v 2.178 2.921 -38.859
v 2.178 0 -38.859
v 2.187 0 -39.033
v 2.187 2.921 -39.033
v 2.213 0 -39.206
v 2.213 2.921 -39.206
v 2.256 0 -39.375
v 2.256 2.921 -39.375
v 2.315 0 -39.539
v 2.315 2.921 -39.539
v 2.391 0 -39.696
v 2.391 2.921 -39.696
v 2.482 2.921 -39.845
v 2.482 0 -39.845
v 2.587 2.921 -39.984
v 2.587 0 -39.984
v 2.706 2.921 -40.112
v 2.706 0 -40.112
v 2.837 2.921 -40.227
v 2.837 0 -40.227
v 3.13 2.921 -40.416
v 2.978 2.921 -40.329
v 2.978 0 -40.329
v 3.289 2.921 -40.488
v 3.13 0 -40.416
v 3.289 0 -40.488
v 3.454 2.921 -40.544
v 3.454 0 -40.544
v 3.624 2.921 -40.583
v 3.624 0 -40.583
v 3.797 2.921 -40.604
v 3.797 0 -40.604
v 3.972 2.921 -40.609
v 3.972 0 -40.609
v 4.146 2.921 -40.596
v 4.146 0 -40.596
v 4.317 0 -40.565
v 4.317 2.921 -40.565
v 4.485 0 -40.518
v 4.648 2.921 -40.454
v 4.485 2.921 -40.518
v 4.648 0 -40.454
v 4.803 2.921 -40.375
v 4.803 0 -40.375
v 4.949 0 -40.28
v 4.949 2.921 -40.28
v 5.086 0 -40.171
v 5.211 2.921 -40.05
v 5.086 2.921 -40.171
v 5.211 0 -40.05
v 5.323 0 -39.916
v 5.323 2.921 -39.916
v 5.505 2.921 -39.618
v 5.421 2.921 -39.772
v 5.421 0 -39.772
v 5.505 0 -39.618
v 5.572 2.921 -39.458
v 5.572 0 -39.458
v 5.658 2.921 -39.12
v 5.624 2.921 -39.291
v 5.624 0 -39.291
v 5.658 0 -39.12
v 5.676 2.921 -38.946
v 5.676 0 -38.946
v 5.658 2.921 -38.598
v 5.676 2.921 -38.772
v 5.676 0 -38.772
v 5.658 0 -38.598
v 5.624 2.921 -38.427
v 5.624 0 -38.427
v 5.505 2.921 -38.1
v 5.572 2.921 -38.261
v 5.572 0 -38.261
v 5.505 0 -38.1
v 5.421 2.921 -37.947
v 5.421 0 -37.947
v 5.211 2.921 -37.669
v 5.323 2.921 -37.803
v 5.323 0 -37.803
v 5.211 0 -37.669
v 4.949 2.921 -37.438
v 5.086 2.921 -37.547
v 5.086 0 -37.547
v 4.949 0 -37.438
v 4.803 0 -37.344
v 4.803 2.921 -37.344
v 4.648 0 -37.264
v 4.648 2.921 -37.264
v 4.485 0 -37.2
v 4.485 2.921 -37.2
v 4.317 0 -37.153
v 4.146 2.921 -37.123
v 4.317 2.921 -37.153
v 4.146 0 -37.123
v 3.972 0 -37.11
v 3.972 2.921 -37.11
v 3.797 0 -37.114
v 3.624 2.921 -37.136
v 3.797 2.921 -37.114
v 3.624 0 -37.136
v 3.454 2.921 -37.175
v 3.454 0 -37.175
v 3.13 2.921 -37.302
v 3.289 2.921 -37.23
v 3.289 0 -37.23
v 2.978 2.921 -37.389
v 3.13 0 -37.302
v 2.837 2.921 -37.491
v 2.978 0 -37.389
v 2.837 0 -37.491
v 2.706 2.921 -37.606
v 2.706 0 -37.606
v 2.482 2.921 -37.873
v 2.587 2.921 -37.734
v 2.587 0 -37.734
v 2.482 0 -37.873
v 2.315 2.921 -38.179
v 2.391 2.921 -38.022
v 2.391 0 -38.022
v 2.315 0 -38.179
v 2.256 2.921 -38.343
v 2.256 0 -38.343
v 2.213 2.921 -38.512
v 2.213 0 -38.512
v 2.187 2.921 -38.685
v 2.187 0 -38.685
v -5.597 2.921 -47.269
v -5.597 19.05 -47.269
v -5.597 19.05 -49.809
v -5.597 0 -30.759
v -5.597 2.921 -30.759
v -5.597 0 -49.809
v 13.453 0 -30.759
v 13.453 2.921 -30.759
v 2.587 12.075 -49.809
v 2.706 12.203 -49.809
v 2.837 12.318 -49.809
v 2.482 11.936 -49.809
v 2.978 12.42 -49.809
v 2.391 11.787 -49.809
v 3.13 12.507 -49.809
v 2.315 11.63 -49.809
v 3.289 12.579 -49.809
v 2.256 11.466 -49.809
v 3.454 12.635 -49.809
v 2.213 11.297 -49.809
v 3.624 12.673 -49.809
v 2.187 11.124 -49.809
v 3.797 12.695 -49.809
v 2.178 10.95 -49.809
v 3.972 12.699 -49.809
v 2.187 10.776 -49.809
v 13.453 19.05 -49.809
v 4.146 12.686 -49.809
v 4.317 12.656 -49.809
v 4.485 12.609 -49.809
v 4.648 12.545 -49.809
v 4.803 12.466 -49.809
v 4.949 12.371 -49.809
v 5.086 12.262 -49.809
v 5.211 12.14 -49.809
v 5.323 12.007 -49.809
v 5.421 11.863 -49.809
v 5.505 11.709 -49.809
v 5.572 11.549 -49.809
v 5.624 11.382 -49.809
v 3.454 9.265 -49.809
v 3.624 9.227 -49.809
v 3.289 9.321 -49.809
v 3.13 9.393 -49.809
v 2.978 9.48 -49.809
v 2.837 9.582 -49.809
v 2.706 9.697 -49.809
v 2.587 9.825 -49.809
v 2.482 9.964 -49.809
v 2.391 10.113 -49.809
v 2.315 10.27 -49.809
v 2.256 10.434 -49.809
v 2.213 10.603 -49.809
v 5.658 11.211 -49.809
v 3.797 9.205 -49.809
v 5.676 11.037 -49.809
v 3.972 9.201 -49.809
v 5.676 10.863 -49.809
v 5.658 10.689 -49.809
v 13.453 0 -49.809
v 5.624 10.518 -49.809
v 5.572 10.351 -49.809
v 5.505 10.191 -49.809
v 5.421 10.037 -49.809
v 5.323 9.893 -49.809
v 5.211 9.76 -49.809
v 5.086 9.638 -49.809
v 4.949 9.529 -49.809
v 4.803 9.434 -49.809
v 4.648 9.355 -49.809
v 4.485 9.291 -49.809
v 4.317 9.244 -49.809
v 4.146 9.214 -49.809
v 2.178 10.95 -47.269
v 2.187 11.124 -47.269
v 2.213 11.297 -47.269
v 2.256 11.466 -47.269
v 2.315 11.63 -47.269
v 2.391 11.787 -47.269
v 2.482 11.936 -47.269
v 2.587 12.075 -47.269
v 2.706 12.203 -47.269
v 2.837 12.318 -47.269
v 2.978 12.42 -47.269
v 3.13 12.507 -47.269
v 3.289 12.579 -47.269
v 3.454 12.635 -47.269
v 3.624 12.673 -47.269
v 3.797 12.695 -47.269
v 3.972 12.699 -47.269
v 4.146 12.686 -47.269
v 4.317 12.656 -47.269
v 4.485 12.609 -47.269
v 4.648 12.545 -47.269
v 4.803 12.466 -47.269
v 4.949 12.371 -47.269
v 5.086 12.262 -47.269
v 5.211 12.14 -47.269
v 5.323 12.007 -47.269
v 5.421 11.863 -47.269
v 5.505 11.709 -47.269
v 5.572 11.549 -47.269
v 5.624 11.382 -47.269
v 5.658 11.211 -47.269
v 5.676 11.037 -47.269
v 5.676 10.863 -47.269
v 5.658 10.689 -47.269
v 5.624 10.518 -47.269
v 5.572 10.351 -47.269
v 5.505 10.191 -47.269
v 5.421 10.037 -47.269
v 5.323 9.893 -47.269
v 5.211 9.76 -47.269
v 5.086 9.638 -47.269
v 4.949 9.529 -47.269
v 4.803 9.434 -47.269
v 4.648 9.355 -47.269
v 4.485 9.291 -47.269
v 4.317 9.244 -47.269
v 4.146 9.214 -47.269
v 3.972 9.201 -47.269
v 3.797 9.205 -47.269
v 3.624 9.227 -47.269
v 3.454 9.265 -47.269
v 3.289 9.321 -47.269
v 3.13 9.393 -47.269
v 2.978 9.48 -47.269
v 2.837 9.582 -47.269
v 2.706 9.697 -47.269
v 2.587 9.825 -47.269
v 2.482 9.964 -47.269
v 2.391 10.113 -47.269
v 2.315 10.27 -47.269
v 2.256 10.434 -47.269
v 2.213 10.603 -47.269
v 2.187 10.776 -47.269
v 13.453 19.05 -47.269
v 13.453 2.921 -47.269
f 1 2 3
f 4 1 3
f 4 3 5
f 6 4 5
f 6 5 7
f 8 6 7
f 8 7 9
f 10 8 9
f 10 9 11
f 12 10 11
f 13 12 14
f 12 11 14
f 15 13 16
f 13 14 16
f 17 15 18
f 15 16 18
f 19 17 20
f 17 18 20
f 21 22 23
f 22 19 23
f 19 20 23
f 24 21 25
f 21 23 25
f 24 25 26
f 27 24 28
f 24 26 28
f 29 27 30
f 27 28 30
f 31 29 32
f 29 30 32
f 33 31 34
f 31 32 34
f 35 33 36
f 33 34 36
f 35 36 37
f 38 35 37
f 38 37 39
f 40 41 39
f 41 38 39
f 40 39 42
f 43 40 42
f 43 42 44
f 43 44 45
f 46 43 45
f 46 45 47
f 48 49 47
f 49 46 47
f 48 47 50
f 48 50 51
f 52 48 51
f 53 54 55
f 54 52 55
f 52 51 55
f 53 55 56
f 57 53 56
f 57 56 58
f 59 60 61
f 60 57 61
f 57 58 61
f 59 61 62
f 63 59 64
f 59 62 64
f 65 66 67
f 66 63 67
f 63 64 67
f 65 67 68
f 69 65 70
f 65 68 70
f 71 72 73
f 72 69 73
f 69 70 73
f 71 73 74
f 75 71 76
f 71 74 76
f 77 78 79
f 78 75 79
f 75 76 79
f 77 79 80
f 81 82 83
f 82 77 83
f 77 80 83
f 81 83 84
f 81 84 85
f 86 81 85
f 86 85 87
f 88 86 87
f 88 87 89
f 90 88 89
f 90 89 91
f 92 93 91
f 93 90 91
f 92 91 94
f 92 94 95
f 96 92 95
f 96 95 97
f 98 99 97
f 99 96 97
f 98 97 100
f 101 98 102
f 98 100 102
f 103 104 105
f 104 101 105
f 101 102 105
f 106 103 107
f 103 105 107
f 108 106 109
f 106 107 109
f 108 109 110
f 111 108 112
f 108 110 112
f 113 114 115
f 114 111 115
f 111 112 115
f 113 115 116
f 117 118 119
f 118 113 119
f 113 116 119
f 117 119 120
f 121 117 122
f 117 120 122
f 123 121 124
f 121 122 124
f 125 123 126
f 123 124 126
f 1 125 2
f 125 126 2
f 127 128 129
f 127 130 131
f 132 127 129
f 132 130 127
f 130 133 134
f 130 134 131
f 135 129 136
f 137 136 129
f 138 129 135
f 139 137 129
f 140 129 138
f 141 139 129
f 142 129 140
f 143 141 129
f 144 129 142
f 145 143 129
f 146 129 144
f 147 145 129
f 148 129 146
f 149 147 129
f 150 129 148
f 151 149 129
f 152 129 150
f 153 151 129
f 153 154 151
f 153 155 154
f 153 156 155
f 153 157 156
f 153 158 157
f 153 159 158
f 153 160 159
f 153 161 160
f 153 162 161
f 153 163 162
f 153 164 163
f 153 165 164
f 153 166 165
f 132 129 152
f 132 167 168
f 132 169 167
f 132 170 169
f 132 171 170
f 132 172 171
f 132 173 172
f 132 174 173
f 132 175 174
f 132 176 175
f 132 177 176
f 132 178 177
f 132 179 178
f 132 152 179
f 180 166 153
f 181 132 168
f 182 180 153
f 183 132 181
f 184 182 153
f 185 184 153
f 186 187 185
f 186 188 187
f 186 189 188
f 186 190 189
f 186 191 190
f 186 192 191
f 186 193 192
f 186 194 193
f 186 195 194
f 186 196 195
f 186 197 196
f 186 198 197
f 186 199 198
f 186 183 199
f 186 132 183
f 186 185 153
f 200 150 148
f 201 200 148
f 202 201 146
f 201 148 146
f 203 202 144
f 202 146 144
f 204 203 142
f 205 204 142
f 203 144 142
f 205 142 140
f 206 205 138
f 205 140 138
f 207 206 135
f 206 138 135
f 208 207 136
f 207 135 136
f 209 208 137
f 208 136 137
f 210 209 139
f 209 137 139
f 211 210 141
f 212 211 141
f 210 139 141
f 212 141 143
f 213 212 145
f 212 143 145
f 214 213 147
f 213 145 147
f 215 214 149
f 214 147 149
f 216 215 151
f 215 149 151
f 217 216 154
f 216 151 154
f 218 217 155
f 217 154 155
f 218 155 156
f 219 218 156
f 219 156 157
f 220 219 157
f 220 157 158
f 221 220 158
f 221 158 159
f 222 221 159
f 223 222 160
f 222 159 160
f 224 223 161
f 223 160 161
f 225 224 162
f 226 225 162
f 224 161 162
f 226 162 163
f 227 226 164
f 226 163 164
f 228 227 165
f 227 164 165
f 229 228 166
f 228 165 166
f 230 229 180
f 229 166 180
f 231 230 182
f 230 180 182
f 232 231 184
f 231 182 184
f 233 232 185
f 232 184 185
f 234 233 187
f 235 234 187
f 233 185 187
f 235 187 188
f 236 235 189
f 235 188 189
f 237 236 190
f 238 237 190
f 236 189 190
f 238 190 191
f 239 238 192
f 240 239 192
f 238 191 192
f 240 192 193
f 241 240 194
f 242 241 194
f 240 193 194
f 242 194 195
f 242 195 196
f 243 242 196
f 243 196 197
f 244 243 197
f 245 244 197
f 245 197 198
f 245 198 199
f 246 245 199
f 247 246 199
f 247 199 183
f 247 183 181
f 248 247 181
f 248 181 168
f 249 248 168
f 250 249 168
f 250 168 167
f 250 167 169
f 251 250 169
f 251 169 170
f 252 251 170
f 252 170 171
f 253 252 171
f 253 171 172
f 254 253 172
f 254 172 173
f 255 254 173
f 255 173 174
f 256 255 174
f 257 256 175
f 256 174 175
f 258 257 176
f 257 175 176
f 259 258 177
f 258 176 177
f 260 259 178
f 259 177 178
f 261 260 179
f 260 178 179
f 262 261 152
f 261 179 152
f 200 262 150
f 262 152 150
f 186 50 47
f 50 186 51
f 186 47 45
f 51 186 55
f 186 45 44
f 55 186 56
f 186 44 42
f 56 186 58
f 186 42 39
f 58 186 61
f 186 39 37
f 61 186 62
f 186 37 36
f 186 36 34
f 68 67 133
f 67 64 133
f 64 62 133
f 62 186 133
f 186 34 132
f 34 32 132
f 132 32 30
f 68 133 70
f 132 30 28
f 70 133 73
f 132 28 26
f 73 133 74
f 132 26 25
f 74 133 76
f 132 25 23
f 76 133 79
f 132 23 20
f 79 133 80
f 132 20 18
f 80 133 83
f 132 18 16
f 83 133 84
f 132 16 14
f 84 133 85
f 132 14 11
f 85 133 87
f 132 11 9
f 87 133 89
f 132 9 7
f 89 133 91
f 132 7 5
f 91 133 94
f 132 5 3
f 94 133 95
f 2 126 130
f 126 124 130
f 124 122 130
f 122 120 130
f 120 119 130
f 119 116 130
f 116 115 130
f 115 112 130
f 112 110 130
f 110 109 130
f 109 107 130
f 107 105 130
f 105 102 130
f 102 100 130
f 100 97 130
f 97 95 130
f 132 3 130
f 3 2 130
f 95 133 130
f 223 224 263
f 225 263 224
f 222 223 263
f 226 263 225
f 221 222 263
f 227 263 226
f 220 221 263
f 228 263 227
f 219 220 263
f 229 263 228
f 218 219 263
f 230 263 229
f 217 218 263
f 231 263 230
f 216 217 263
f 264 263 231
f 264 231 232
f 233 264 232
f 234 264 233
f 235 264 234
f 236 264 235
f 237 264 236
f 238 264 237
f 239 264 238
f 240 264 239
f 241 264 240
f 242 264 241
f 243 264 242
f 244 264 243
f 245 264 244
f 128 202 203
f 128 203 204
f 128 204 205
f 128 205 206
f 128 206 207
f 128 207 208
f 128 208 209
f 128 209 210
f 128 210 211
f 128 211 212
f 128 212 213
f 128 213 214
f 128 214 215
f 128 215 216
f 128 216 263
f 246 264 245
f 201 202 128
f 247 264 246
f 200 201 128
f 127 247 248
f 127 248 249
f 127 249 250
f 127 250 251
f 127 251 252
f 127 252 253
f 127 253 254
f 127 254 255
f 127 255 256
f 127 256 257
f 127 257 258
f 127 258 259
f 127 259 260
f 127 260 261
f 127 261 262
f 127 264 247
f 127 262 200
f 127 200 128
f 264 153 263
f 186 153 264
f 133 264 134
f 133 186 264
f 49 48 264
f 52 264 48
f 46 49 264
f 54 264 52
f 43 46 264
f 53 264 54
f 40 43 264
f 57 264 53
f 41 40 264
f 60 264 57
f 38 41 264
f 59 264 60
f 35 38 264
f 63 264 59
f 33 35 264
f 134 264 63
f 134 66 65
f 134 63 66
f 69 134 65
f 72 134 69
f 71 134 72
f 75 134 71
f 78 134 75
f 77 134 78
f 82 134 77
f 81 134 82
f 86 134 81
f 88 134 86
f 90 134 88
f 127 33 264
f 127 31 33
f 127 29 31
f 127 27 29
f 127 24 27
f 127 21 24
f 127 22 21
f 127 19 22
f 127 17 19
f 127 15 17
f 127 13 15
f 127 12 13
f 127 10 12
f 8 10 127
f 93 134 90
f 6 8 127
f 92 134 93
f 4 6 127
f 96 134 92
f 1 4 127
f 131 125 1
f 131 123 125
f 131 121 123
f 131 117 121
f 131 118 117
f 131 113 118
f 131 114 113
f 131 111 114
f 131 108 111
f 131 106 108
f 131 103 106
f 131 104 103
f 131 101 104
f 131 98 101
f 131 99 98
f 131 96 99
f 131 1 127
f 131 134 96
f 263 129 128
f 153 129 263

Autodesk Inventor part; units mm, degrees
ref_plane "YZ Plane" through (0, 0, 0) normal (1, 0, 0) x (0, 1, 0)
ref_plane "XZ Plane" through (0, 0, 0) normal (0, 1, 0) x (-1, 0, 0)
ref_plane "XY Plane" through (0, 0, 0) normal (0, 0, 1) x (1, 0, 0)
sketch "Sketch1" plane through (0, 0, 0) normal (0, 1, 0) x (-1, 0, 0)
  line L0 (-13.4529, -30.7592) -> (5.5971, -30.7592)
  line L1 (5.5971, -30.7592) -> (5.5971, -49.8092)
  line L2 (5.5971, -49.8092) -> (-13.4529, -49.8092)
  line L3 (-13.4529, -49.8092) -> (-13.4529, -30.7592)
  line L4 (-13.4529, -30.7592) -> (5.5971, -49.8092) construction
  line L5 (5.5971, -30.7592) -> (-13.4529, -49.8092) construction
  line L6 (-3.9279, -30.7592) -> (-3.9279, -38.8592) construction
  circle A0 centre (-3.9279, -38.8592) radius 1.75
  point P0 (0, 0)
  point P1 (-3.9279, -40.2842)
  dimension "d0" = 19.05
  dimension "d1" = 19.05
  dimension "d8" = 8.1
  dimension "d9" = 3.5
extrude "Extrusion1" add sketch "Sketch1" along normal blind 2.921
sketch "Sketch2" plane through (0, 2.921, 0) normal (0, 1, 0) x (1, 0, 0)
  line L0 (-5.5971, 49.8092) -> (13.4529, 49.8092)
  line L1 (13.4529, 49.8092) -> (13.4529, 47.2692)
  line L2 (13.4529, 47.2692) -> (-5.5971, 47.2692)
  line L3 (-5.5971, 47.2692) -> (-5.5971, 49.8092)
  point P0 (0, 0)
  dimension "d4" = 19.05
  dimension "d5" = 2.54
extrude "Extrusion2" add sketch "Sketch2" along normal blind 16.129
sketch "Sketch3" plane through (13.4529, 0, -49.8092) normal (0, 0, -1) x (-1, 0, 0)
  line L0 (19.05, 0) -> (0, 0) construction
  line L1 (19.05, 0) -> (19.05, 19.05) construction
  line L2 (0, 19.05) -> (19.05, 19.05) construction
  line L3 (0, 0) -> (0, 19.05) construction
  line L4 (0, 19.05) -> (19.05, 19.05) construction
  line L5 (9.525, 19.05) -> (9.525, 10.95) construction
  circle A0 centre (9.525, 10.95) radius 1.75
  point P0 (13.4529, 0)
  dimension "d10" = 8.1
  dimension "d11" = 3.5
extrude "Extrusion3" cut sketch "Sketch3" against normal blind 25.4
